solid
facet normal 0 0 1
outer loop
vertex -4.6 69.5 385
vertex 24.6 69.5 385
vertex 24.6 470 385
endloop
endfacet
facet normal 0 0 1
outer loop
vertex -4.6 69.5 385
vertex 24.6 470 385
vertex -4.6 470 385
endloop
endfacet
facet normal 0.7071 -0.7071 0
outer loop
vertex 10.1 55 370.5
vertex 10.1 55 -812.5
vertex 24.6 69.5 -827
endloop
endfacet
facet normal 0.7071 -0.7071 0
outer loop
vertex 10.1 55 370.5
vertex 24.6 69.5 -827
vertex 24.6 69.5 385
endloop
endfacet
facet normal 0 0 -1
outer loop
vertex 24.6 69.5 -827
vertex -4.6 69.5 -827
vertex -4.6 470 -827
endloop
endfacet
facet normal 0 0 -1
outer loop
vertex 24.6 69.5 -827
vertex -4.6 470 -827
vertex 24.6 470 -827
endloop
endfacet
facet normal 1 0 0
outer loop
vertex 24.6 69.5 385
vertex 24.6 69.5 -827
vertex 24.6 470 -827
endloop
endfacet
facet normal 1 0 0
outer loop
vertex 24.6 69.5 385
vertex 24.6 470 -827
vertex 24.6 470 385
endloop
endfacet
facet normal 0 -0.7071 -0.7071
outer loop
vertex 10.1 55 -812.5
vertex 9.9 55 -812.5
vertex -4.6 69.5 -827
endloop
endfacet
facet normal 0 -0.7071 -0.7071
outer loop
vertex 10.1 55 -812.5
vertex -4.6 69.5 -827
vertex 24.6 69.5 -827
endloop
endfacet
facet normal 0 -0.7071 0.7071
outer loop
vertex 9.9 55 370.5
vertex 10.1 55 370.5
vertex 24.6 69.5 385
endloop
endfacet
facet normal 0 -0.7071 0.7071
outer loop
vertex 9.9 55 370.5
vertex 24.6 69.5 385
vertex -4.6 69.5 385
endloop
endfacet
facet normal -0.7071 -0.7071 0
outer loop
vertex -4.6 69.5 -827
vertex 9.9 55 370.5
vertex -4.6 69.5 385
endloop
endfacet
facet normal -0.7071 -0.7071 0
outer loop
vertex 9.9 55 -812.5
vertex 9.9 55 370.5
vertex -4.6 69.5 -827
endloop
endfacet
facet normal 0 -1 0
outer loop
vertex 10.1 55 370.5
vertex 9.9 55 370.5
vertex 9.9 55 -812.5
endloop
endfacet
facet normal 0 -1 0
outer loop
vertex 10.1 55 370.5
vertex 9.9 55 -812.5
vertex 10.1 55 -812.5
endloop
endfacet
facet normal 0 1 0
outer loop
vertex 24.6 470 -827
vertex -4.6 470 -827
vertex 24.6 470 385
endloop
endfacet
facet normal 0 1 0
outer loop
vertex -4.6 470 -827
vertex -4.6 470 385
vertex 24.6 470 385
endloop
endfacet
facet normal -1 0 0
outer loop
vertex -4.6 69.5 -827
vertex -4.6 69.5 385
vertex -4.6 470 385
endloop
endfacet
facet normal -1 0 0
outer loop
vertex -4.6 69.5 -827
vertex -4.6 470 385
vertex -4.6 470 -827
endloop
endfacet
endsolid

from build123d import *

# Parameters (mm, degrees)
F1_START = -55
F1_DEPTH = 415
F2_SIZE2 = 14.5
F2_SIZE  = 14.5


with BuildPart() as f1:
    # F0 (on Front) → F1 (new body)
    with BuildSketch(Plane.XZ.offset(F1_START)):
        Polygon((-4.6, -740), (-4.6, -827), (24.6, -827), (24.6, -740), (24.6, -725), (24.6, -365), (24.6, -350), (24.6, 10), (24.6, 25), (24.6, 385), (-4.6, 385), (-4.6, 25), (-4.6, 10), (-4.6, -350), (-4.6, -365), (-4.6, -725), align=None)
    extrude(amount=-F1_DEPTH)

    # F2
    f2_edges = [f1.edges().sort_by_distance(p)[0] for p in [
        (-4.6, 55, -221),
        (10, 55, -827),
        (24.6, 55, -221),
        (10, 55, 385),
    ]]
    chamfer(f2_edges, length=F2_SIZE, length2=F2_SIZE2)


solid = f1.part
